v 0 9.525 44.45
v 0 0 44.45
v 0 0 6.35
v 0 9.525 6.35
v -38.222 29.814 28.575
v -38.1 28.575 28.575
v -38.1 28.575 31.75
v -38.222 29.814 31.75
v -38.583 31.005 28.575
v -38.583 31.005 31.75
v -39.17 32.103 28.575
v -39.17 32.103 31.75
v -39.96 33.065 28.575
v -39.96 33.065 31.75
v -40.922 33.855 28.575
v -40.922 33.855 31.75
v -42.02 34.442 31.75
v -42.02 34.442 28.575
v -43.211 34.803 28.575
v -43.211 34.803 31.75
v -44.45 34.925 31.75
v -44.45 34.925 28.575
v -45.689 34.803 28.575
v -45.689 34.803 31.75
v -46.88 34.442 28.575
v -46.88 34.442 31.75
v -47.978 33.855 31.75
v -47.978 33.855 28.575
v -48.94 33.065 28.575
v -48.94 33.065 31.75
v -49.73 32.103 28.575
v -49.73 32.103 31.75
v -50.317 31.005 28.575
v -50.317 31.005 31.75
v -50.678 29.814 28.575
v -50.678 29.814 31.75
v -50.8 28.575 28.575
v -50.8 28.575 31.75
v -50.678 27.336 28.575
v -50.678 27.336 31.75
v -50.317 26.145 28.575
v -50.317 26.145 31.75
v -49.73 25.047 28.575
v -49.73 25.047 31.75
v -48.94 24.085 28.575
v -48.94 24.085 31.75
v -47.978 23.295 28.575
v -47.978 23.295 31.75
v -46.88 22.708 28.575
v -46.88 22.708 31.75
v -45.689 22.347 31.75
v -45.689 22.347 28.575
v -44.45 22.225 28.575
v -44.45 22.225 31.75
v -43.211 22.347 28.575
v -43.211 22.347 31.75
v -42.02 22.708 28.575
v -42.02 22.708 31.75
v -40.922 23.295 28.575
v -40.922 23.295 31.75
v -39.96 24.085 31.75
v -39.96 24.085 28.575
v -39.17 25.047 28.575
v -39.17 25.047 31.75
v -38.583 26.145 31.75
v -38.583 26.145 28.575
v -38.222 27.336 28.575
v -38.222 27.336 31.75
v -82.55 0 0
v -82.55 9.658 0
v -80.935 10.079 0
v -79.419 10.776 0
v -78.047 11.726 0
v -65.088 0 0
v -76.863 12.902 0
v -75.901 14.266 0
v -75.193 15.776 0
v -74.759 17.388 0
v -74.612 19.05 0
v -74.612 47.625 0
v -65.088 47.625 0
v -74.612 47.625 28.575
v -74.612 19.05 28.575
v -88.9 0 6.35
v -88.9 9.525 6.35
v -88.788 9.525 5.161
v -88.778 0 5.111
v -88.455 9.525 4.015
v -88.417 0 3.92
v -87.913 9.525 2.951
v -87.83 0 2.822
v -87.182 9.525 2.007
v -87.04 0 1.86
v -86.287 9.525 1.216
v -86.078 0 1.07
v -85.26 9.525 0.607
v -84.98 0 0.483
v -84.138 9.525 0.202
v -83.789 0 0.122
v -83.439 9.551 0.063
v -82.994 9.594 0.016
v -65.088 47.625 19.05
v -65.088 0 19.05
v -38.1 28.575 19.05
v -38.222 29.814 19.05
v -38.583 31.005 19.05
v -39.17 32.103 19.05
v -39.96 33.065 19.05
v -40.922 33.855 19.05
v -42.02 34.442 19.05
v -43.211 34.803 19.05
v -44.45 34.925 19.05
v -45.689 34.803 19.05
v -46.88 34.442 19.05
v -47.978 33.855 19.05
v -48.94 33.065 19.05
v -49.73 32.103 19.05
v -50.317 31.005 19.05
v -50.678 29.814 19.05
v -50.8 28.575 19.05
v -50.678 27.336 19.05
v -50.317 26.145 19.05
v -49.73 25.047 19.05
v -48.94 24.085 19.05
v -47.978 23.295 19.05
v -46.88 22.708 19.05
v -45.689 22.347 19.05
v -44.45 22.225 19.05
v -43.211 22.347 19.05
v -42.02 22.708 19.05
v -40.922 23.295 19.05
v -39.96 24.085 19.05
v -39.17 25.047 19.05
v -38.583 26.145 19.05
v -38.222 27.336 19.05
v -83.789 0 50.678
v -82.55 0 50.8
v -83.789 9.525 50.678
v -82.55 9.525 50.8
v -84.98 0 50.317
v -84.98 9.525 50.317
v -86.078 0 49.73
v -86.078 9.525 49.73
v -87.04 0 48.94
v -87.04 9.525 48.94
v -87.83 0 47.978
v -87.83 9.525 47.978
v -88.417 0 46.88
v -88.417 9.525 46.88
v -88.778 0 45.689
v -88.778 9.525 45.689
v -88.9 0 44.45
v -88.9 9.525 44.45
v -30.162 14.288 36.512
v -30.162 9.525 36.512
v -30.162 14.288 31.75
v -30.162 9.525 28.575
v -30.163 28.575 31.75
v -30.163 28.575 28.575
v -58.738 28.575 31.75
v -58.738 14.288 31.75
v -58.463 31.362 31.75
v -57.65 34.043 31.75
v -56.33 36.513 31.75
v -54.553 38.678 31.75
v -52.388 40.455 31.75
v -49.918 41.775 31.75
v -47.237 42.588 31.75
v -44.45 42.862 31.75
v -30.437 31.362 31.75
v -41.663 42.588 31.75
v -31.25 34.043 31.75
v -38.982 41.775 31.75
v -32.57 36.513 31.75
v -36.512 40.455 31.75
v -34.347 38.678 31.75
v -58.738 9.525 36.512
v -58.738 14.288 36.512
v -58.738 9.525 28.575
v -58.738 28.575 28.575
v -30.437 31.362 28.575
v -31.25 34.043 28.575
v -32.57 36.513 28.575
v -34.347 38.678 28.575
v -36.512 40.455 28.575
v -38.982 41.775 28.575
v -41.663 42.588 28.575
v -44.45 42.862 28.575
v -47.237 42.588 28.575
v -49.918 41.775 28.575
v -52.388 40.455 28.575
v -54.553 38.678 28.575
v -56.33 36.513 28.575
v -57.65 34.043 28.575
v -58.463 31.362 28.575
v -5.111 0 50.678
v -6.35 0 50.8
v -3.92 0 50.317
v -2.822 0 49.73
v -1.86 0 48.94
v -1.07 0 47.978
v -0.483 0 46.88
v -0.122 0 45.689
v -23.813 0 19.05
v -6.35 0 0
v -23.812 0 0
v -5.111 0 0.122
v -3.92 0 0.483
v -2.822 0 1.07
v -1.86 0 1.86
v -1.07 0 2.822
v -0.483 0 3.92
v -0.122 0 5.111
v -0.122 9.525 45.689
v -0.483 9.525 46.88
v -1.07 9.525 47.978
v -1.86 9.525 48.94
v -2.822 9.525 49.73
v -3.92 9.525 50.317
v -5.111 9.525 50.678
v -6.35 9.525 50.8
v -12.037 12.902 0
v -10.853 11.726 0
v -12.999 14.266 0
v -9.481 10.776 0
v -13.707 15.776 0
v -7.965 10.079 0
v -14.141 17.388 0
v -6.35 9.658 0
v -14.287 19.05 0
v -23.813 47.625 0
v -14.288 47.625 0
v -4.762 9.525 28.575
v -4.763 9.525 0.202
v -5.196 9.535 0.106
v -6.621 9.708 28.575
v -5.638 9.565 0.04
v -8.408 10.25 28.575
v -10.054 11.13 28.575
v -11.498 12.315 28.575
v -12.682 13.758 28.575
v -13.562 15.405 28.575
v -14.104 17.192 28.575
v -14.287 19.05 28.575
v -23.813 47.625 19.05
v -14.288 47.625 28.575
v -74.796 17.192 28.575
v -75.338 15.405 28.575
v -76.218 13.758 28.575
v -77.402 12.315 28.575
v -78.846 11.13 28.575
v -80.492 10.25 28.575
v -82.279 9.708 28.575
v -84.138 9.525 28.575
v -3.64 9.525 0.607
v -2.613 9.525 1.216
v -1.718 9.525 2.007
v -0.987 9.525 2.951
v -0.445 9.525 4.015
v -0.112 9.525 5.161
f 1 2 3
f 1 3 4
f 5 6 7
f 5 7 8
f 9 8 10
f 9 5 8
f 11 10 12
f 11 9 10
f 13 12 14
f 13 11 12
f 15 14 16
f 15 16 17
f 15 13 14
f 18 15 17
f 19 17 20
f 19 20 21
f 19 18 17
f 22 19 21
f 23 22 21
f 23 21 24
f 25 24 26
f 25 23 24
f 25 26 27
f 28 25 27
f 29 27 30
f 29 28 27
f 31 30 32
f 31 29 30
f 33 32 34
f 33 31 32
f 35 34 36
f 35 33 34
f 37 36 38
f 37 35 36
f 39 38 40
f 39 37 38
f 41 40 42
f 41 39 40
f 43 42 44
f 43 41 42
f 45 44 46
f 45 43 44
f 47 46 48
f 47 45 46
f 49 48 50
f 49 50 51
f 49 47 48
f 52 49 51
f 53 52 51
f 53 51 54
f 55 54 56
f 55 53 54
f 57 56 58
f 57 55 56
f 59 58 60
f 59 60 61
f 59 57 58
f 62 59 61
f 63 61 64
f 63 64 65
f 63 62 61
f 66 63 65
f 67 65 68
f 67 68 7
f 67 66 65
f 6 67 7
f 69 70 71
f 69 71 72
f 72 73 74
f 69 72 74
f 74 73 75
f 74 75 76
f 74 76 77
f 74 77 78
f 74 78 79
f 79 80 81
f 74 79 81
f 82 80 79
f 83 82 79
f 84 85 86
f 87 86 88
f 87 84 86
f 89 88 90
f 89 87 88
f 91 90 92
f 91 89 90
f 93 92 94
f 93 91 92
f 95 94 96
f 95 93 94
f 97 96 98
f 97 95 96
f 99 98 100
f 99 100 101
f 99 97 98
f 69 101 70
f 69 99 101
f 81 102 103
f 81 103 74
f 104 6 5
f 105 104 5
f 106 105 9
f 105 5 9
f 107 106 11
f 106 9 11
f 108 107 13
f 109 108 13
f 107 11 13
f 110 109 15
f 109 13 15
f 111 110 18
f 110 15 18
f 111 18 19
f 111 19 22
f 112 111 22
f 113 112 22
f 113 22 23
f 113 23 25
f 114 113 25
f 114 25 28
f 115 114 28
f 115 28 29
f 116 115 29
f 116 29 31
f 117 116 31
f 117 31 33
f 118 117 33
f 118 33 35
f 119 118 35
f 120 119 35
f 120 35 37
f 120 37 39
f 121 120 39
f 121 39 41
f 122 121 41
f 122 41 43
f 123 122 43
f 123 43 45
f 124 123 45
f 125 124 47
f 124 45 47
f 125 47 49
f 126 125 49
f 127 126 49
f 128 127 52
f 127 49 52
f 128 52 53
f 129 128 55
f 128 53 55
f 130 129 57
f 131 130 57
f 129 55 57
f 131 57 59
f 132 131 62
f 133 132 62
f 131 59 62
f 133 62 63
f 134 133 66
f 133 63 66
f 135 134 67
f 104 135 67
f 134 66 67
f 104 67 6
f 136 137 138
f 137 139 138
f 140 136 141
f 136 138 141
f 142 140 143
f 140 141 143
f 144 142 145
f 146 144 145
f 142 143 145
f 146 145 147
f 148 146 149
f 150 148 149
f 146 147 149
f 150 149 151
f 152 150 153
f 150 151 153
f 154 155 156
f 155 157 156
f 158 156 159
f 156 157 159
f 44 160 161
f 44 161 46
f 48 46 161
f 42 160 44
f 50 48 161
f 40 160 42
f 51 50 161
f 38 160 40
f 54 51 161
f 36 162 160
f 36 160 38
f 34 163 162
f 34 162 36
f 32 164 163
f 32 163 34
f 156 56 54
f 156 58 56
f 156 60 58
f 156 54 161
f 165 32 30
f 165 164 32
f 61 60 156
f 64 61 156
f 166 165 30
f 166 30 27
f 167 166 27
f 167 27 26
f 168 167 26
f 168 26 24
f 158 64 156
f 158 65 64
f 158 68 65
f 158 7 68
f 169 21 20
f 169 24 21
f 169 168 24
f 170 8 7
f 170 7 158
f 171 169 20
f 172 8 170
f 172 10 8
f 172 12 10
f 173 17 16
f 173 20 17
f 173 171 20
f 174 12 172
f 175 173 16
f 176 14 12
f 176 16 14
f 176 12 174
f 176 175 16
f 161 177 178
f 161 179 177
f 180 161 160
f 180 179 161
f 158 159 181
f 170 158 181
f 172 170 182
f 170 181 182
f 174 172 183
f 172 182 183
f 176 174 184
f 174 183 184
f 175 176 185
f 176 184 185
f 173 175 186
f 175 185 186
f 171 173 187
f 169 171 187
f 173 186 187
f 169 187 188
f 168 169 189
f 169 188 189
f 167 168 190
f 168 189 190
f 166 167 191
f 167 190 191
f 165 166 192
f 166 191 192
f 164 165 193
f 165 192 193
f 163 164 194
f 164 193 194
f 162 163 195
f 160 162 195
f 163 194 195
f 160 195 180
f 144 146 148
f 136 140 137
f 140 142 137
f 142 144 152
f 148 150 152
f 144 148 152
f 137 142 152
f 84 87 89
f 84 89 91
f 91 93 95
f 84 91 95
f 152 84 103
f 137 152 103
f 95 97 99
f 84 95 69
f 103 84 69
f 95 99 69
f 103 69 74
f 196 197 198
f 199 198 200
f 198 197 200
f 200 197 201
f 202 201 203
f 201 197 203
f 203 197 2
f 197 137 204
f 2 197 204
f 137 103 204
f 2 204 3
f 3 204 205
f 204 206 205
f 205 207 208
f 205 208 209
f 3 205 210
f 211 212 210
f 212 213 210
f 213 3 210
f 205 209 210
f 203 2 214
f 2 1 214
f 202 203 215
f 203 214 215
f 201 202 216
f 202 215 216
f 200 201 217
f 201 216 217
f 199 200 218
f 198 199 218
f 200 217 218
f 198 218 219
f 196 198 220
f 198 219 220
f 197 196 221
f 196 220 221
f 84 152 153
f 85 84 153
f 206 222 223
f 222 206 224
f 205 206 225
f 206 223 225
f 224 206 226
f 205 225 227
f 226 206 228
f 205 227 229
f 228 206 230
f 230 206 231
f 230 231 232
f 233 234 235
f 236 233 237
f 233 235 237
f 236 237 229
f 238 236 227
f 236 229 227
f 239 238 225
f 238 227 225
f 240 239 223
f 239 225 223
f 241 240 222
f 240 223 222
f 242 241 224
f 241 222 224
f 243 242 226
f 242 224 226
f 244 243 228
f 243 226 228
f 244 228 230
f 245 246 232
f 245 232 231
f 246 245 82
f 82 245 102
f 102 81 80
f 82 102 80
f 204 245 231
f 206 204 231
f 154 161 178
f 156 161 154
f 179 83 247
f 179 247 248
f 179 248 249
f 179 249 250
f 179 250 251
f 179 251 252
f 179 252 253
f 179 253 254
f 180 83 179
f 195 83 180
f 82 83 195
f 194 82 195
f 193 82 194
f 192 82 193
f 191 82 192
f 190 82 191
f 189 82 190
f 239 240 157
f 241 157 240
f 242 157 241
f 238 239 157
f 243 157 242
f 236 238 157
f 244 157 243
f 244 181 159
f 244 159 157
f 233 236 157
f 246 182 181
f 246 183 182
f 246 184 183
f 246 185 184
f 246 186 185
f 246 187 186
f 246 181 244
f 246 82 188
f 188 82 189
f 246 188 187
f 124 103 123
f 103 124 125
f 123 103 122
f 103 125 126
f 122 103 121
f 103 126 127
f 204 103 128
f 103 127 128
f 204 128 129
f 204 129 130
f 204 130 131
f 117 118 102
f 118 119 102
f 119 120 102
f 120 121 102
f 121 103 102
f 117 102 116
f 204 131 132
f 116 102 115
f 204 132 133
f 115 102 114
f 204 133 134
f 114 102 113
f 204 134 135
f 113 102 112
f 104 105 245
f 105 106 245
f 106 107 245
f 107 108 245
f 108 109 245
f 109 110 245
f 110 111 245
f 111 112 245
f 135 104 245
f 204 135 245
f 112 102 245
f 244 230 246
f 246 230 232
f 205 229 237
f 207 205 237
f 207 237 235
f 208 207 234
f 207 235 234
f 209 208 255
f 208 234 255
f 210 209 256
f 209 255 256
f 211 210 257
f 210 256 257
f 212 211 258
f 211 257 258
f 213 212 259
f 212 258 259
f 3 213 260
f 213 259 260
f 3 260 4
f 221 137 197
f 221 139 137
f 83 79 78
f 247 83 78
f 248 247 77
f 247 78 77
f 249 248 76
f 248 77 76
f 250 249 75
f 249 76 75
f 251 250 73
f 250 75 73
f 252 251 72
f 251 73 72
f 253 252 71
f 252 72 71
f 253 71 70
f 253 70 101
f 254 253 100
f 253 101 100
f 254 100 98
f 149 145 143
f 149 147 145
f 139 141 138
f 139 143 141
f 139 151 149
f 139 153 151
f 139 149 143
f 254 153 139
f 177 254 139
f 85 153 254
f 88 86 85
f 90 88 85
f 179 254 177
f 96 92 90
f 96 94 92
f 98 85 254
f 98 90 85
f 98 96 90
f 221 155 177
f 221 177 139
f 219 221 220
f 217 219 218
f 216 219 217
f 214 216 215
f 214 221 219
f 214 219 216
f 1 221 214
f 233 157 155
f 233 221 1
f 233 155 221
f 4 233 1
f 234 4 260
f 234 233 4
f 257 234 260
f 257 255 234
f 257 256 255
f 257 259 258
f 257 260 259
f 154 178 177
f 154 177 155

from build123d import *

# Parameters (mm, degrees)
BOSS_EXTRUDE1_DEPTH = 50.8
SKETCH2_W           = 41.275
SKETCH2_H           = 19.05
SKETCH2_W_2         = 88.9
SKETCH2_H_2         = 22.225
CUT_EXTRUDE2_DEPTH  = 48.625
SKETCH3_R           = 6.35
BOSS_EXTRUDE2_DEPTH = 3.175
SKETCH4_W           = 88.9
SKETCH4_H           = 9.525
BOSS_EXTRUDE3_DEPTH = 22.225
SKETCH5_W           = 28.575
SKETCH5_H           = 4.7625
BOSS_EXTRUDE4_DEPTH = 4.7625
FILLET1_R           = 6.35
SKETCH6_R           = 6.35
CUT_EXTRUDE3_DEPTH  = 29.5750001


with BuildPart() as part:
    # Sketch1 → Boss-Extrude1 (new body)
    with BuildSketch(Plane.XY):
        with BuildLine():
            Line((-14.2875, 47.625), (-74.6125, 47.625))
            Line((-74.6125, 47.625), (-74.6125, 19.05))
            ThreePointArc((-74.6125, 19.05), (-77.402307909, 12.314807909), (-84.1375, 9.525))
            Line((-84.1375, 9.525), (-88.9, 9.525))
            Line((-88.9, 9.525), (-88.9, 0))
            Line((-88.9, 0), (0, 0))
            Line((0, 0), (0, 9.525))
            Line((0, 9.525), (-4.7625, 9.525))
            ThreePointArc((-4.7625, 9.525), (-11.497692091, 12.314807909), (-14.2875, 19.05))
            Line((-14.2875, 19.05), (-14.2875, 47.625))
        make_face()
    extrude(amount=BOSS_EXTRUDE1_DEPTH)

    # Sketch2 → Cut-Extrude2 (cut, through all)
    with BuildSketch(Plane(origin=(0, 47.625, 0), x_dir=(1, 0, 0), z_dir=(0, 1, 0))):
        with Locations((-44.45, -9.525)):
            Rectangle(SKETCH2_W, SKETCH2_H)
        with Locations((-44.45, -39.6875)):
            Rectangle(SKETCH2_W_2, SKETCH2_H_2)
    extrude(amount=-CUT_EXTRUDE2_DEPTH, mode=Mode.SUBTRACT)

    # Sketch3 → Boss-Extrude2 (add)
    with BuildSketch(Plane.XY.offset(28.575)):
        with BuildLine():
            Line((-58.7375, 28.575), (-58.7375, 9.525))
            Line((-58.7375, 9.525), (-30.1625, 9.525))
            Line((-30.1625, 9.525), (-30.1625, 28.575))
            ThreePointArc((-30.1625, 28.575), (-44.45, 42.8625), (-58.7375, 28.575))
        make_face()
        with Locations((-44.45, 28.575)):
            Circle(SKETCH3_R, mode=Mode.SUBTRACT)
    extrude(amount=BOSS_EXTRUDE2_DEPTH)

    # Sketch4 → Boss-Extrude3 (add)
    with BuildSketch(Plane.XY.offset(28.575)):
        with Locations((-44.45, 4.7625)):
            Rectangle(SKETCH4_W, SKETCH4_H)
    extrude(amount=BOSS_EXTRUDE3_DEPTH)

    # Sketch5 → Boss-Extrude4 (add)
    with BuildSketch(Plane.XY.offset(31.75)):
        with Locations((-44.45, 11.90625)):
            Rectangle(SKETCH5_W, SKETCH5_H)
    extrude(amount=BOSS_EXTRUDE4_DEPTH)

    # Fillet1
    fillet1_edges = [part.edges().sort_by_distance(p)[0] for p in [
        (-88.9, 4.7625, 0),
        (-88.9, 4.7625, 50.8),
        (0, 4.7625, 50.8),
        (0, 4.7625, 0),
    ]]
    fillet(fillet1_edges, radius=FILLET1_R)

    # Sketch6 → Cut-Extrude3 (cut, through all)
    with BuildSketch(Plane.XY.offset(28.575)):
        with Locations((-44.45, 28.575)):
            Circle(SKETCH6_R)
    extrude(amount=-CUT_EXTRUDE3_DEPTH, mode=Mode.SUBTRACT)


solid = part.part
